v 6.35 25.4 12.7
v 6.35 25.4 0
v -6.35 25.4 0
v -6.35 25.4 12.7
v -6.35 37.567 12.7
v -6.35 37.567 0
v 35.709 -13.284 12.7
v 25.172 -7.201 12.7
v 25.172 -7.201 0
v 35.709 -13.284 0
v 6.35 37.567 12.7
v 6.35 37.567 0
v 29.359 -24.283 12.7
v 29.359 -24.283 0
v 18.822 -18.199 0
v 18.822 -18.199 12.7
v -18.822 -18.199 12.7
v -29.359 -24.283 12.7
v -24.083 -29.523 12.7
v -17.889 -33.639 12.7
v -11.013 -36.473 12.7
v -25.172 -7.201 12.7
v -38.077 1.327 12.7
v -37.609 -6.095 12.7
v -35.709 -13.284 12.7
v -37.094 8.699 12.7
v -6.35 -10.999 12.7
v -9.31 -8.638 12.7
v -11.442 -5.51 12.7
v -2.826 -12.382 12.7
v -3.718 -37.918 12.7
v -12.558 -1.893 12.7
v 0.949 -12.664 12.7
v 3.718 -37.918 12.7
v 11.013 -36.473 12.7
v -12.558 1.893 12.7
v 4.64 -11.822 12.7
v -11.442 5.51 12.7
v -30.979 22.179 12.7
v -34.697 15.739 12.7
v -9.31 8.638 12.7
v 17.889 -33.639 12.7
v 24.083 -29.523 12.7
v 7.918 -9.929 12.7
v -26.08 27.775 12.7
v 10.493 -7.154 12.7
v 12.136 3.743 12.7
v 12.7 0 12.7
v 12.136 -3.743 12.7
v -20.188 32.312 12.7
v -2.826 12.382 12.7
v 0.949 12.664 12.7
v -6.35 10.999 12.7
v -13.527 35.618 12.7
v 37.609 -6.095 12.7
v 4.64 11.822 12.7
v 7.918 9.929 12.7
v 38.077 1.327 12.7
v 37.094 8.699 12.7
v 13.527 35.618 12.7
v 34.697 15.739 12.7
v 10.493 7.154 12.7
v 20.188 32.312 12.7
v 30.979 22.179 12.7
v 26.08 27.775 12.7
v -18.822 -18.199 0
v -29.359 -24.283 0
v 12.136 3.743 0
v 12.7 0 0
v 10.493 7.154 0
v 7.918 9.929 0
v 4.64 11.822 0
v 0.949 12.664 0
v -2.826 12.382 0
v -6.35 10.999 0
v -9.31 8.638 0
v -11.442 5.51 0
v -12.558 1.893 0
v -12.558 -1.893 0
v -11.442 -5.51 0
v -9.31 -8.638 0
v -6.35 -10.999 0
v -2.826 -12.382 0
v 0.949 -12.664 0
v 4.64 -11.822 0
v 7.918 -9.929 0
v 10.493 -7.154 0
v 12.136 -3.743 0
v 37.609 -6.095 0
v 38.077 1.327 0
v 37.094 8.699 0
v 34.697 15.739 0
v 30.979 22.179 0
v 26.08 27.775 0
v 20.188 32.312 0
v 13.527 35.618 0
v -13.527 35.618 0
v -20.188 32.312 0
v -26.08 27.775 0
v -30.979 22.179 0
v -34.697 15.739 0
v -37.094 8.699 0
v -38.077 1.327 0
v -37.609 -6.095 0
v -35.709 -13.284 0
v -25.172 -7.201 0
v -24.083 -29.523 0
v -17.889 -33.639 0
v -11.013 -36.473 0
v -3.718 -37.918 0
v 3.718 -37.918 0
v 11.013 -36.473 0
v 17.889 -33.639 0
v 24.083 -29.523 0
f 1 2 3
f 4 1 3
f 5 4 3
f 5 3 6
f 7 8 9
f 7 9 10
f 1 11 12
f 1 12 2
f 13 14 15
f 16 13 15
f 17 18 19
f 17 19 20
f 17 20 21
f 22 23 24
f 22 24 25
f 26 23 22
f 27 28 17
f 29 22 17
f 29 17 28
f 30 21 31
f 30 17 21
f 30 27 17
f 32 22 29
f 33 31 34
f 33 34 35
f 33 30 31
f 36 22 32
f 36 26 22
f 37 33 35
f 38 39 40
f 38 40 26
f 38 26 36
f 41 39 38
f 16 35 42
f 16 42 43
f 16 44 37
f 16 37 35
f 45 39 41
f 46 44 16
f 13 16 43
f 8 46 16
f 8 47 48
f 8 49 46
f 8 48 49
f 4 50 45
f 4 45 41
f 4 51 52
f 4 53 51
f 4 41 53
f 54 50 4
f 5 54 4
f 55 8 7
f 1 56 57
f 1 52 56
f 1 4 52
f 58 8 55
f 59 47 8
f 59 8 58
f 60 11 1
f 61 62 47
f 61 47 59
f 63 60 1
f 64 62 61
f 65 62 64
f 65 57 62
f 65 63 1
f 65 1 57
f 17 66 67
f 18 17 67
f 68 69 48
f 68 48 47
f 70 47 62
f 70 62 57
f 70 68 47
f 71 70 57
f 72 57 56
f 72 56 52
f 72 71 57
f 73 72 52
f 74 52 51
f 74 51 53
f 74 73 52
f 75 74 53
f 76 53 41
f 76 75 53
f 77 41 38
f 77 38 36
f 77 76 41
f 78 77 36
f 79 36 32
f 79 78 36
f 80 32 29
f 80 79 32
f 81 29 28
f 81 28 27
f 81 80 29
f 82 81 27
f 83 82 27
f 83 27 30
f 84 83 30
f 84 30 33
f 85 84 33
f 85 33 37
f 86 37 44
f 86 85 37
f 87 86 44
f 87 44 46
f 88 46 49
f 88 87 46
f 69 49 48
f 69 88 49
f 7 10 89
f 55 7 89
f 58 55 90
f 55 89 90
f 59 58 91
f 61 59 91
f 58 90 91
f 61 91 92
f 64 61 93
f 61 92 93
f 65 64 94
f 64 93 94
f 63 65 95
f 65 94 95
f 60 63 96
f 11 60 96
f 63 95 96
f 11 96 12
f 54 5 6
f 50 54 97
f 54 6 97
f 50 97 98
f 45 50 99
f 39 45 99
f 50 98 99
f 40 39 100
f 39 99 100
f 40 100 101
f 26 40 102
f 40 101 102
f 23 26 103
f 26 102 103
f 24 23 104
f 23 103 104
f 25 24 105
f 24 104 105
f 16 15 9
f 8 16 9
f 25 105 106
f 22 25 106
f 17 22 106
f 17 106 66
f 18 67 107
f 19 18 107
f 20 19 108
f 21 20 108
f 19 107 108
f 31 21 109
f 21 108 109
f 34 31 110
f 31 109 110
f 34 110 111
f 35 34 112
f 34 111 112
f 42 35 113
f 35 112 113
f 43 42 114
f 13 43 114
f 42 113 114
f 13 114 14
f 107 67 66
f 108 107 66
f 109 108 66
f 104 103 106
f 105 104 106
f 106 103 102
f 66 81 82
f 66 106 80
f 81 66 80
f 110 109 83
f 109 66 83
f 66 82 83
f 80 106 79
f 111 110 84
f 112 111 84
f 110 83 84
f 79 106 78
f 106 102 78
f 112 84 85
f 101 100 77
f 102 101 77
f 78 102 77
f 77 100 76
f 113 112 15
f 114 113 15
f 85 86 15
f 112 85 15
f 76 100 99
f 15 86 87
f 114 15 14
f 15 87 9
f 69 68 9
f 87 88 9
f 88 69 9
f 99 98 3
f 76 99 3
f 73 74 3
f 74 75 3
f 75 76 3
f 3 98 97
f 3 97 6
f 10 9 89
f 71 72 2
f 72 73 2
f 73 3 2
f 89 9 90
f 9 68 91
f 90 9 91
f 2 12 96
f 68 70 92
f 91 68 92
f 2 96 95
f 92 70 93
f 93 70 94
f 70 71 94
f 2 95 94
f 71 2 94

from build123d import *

# Parameters (mm, degrees)
F0_R     = 12.7
F1_DEPTH = 12.7


with BuildPart() as f1:
    # F0 (on Top) → F1 (new body)
    with BuildSketch(Plane.XY):
        with BuildLine():
            Line((-6.35, 25.4), (-6.35, 37.567107))
            ThreePointArc((-6.35, 37.567107), (-32.995568, 19.05), (-35.709069, -13.284292))
            Line((-35.709069, -13.284292), (-25.172045, -7.200739))
            Line((-25.172045, -7.200739), (-18.822045, -18.199261))
            Line((-18.822045, -18.199261), (-29.359069, -24.282815))
            ThreePointArc((-29.359069, -24.282815), (0, -38.1), (29.359069, -24.282815))
            Line((29.359069, -24.282815), (18.822045, -18.199261))
            Line((18.822045, -18.199261), (25.172045, -7.200739))
            Line((25.172045, -7.200739), (35.709069, -13.284292))
            ThreePointArc((35.709069, -13.284292), (32.995568, 19.05), (6.35, 37.567107))
            Line((6.35, 37.567107), (6.35, 25.4))
            Line((6.35, 25.4), (-6.35, 25.4))
        make_face()
        Circle(F0_R, mode=Mode.SUBTRACT)
    extrude(amount=F1_DEPTH)


solid = f1.part
